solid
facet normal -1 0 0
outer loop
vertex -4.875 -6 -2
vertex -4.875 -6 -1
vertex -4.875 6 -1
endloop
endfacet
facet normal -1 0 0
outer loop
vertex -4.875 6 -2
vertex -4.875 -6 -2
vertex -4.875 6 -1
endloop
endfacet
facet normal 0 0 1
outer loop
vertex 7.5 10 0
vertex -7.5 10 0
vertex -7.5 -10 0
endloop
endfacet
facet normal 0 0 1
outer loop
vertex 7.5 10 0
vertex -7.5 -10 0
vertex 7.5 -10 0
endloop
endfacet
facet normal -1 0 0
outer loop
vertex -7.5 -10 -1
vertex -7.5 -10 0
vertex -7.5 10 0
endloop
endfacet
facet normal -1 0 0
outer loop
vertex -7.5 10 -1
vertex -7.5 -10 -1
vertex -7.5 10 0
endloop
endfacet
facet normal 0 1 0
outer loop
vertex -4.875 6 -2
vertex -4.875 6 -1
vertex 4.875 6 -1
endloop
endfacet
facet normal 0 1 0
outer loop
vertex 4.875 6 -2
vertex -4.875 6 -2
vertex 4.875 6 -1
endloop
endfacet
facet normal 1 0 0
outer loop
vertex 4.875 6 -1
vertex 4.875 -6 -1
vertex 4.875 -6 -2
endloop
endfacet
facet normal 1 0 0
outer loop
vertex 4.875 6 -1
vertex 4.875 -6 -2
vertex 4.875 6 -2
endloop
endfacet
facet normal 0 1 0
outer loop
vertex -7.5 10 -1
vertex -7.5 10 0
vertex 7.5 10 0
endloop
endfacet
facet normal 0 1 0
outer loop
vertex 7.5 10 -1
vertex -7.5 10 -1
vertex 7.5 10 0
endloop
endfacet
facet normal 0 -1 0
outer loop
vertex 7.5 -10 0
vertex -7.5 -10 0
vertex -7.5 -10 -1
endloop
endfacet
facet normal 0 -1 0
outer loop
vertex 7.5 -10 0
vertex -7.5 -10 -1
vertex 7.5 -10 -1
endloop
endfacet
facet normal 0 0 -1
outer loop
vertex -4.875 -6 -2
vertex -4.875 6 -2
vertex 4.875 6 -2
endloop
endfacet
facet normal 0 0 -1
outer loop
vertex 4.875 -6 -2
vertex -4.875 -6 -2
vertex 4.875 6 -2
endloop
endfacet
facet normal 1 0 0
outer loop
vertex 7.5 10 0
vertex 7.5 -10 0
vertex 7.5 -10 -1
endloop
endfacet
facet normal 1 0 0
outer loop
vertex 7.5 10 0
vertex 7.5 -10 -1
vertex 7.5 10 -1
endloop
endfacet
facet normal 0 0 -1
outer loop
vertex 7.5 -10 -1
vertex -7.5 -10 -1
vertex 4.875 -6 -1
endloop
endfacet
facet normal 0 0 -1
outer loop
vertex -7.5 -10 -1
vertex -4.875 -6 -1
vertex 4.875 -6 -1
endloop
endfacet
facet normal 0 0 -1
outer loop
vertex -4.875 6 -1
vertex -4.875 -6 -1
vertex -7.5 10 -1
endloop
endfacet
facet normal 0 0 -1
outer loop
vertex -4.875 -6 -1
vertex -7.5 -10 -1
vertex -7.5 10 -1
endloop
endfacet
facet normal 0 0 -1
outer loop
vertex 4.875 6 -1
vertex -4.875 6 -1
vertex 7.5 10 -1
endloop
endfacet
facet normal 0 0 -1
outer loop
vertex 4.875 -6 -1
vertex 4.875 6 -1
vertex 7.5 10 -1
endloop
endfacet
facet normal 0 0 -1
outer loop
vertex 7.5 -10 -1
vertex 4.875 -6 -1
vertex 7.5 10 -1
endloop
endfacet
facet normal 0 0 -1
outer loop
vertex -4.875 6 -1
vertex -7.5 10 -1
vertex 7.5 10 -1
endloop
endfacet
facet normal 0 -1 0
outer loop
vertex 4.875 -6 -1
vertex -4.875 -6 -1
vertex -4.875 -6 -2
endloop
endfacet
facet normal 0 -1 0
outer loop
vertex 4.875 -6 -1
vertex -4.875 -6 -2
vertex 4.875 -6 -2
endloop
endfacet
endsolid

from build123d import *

# Parameters (mm, degrees)
SKETCH1_W           = 15
SKETCH1_H           = 20
BOSS_EXTRUDE1_DEPTH = 1
SKETCH2_W           = 9.75
SKETCH2_H           = 12
BOSS_EXTRUDE2_DEPTH = 2


with BuildPart() as part:
    # Sketch1 → Boss-Extrude1 (new body)
    with BuildSketch(Plane.XY):
        Rectangle(SKETCH1_W, SKETCH1_H)
    extrude(amount=-BOSS_EXTRUDE1_DEPTH)

    # Sketch2 → Boss-Extrude2 (add)
    with BuildSketch(Plane.XY):
        Rectangle(SKETCH2_W, SKETCH2_H)
    extrude(amount=-BOSS_EXTRUDE2_DEPTH)


solid = part.part
